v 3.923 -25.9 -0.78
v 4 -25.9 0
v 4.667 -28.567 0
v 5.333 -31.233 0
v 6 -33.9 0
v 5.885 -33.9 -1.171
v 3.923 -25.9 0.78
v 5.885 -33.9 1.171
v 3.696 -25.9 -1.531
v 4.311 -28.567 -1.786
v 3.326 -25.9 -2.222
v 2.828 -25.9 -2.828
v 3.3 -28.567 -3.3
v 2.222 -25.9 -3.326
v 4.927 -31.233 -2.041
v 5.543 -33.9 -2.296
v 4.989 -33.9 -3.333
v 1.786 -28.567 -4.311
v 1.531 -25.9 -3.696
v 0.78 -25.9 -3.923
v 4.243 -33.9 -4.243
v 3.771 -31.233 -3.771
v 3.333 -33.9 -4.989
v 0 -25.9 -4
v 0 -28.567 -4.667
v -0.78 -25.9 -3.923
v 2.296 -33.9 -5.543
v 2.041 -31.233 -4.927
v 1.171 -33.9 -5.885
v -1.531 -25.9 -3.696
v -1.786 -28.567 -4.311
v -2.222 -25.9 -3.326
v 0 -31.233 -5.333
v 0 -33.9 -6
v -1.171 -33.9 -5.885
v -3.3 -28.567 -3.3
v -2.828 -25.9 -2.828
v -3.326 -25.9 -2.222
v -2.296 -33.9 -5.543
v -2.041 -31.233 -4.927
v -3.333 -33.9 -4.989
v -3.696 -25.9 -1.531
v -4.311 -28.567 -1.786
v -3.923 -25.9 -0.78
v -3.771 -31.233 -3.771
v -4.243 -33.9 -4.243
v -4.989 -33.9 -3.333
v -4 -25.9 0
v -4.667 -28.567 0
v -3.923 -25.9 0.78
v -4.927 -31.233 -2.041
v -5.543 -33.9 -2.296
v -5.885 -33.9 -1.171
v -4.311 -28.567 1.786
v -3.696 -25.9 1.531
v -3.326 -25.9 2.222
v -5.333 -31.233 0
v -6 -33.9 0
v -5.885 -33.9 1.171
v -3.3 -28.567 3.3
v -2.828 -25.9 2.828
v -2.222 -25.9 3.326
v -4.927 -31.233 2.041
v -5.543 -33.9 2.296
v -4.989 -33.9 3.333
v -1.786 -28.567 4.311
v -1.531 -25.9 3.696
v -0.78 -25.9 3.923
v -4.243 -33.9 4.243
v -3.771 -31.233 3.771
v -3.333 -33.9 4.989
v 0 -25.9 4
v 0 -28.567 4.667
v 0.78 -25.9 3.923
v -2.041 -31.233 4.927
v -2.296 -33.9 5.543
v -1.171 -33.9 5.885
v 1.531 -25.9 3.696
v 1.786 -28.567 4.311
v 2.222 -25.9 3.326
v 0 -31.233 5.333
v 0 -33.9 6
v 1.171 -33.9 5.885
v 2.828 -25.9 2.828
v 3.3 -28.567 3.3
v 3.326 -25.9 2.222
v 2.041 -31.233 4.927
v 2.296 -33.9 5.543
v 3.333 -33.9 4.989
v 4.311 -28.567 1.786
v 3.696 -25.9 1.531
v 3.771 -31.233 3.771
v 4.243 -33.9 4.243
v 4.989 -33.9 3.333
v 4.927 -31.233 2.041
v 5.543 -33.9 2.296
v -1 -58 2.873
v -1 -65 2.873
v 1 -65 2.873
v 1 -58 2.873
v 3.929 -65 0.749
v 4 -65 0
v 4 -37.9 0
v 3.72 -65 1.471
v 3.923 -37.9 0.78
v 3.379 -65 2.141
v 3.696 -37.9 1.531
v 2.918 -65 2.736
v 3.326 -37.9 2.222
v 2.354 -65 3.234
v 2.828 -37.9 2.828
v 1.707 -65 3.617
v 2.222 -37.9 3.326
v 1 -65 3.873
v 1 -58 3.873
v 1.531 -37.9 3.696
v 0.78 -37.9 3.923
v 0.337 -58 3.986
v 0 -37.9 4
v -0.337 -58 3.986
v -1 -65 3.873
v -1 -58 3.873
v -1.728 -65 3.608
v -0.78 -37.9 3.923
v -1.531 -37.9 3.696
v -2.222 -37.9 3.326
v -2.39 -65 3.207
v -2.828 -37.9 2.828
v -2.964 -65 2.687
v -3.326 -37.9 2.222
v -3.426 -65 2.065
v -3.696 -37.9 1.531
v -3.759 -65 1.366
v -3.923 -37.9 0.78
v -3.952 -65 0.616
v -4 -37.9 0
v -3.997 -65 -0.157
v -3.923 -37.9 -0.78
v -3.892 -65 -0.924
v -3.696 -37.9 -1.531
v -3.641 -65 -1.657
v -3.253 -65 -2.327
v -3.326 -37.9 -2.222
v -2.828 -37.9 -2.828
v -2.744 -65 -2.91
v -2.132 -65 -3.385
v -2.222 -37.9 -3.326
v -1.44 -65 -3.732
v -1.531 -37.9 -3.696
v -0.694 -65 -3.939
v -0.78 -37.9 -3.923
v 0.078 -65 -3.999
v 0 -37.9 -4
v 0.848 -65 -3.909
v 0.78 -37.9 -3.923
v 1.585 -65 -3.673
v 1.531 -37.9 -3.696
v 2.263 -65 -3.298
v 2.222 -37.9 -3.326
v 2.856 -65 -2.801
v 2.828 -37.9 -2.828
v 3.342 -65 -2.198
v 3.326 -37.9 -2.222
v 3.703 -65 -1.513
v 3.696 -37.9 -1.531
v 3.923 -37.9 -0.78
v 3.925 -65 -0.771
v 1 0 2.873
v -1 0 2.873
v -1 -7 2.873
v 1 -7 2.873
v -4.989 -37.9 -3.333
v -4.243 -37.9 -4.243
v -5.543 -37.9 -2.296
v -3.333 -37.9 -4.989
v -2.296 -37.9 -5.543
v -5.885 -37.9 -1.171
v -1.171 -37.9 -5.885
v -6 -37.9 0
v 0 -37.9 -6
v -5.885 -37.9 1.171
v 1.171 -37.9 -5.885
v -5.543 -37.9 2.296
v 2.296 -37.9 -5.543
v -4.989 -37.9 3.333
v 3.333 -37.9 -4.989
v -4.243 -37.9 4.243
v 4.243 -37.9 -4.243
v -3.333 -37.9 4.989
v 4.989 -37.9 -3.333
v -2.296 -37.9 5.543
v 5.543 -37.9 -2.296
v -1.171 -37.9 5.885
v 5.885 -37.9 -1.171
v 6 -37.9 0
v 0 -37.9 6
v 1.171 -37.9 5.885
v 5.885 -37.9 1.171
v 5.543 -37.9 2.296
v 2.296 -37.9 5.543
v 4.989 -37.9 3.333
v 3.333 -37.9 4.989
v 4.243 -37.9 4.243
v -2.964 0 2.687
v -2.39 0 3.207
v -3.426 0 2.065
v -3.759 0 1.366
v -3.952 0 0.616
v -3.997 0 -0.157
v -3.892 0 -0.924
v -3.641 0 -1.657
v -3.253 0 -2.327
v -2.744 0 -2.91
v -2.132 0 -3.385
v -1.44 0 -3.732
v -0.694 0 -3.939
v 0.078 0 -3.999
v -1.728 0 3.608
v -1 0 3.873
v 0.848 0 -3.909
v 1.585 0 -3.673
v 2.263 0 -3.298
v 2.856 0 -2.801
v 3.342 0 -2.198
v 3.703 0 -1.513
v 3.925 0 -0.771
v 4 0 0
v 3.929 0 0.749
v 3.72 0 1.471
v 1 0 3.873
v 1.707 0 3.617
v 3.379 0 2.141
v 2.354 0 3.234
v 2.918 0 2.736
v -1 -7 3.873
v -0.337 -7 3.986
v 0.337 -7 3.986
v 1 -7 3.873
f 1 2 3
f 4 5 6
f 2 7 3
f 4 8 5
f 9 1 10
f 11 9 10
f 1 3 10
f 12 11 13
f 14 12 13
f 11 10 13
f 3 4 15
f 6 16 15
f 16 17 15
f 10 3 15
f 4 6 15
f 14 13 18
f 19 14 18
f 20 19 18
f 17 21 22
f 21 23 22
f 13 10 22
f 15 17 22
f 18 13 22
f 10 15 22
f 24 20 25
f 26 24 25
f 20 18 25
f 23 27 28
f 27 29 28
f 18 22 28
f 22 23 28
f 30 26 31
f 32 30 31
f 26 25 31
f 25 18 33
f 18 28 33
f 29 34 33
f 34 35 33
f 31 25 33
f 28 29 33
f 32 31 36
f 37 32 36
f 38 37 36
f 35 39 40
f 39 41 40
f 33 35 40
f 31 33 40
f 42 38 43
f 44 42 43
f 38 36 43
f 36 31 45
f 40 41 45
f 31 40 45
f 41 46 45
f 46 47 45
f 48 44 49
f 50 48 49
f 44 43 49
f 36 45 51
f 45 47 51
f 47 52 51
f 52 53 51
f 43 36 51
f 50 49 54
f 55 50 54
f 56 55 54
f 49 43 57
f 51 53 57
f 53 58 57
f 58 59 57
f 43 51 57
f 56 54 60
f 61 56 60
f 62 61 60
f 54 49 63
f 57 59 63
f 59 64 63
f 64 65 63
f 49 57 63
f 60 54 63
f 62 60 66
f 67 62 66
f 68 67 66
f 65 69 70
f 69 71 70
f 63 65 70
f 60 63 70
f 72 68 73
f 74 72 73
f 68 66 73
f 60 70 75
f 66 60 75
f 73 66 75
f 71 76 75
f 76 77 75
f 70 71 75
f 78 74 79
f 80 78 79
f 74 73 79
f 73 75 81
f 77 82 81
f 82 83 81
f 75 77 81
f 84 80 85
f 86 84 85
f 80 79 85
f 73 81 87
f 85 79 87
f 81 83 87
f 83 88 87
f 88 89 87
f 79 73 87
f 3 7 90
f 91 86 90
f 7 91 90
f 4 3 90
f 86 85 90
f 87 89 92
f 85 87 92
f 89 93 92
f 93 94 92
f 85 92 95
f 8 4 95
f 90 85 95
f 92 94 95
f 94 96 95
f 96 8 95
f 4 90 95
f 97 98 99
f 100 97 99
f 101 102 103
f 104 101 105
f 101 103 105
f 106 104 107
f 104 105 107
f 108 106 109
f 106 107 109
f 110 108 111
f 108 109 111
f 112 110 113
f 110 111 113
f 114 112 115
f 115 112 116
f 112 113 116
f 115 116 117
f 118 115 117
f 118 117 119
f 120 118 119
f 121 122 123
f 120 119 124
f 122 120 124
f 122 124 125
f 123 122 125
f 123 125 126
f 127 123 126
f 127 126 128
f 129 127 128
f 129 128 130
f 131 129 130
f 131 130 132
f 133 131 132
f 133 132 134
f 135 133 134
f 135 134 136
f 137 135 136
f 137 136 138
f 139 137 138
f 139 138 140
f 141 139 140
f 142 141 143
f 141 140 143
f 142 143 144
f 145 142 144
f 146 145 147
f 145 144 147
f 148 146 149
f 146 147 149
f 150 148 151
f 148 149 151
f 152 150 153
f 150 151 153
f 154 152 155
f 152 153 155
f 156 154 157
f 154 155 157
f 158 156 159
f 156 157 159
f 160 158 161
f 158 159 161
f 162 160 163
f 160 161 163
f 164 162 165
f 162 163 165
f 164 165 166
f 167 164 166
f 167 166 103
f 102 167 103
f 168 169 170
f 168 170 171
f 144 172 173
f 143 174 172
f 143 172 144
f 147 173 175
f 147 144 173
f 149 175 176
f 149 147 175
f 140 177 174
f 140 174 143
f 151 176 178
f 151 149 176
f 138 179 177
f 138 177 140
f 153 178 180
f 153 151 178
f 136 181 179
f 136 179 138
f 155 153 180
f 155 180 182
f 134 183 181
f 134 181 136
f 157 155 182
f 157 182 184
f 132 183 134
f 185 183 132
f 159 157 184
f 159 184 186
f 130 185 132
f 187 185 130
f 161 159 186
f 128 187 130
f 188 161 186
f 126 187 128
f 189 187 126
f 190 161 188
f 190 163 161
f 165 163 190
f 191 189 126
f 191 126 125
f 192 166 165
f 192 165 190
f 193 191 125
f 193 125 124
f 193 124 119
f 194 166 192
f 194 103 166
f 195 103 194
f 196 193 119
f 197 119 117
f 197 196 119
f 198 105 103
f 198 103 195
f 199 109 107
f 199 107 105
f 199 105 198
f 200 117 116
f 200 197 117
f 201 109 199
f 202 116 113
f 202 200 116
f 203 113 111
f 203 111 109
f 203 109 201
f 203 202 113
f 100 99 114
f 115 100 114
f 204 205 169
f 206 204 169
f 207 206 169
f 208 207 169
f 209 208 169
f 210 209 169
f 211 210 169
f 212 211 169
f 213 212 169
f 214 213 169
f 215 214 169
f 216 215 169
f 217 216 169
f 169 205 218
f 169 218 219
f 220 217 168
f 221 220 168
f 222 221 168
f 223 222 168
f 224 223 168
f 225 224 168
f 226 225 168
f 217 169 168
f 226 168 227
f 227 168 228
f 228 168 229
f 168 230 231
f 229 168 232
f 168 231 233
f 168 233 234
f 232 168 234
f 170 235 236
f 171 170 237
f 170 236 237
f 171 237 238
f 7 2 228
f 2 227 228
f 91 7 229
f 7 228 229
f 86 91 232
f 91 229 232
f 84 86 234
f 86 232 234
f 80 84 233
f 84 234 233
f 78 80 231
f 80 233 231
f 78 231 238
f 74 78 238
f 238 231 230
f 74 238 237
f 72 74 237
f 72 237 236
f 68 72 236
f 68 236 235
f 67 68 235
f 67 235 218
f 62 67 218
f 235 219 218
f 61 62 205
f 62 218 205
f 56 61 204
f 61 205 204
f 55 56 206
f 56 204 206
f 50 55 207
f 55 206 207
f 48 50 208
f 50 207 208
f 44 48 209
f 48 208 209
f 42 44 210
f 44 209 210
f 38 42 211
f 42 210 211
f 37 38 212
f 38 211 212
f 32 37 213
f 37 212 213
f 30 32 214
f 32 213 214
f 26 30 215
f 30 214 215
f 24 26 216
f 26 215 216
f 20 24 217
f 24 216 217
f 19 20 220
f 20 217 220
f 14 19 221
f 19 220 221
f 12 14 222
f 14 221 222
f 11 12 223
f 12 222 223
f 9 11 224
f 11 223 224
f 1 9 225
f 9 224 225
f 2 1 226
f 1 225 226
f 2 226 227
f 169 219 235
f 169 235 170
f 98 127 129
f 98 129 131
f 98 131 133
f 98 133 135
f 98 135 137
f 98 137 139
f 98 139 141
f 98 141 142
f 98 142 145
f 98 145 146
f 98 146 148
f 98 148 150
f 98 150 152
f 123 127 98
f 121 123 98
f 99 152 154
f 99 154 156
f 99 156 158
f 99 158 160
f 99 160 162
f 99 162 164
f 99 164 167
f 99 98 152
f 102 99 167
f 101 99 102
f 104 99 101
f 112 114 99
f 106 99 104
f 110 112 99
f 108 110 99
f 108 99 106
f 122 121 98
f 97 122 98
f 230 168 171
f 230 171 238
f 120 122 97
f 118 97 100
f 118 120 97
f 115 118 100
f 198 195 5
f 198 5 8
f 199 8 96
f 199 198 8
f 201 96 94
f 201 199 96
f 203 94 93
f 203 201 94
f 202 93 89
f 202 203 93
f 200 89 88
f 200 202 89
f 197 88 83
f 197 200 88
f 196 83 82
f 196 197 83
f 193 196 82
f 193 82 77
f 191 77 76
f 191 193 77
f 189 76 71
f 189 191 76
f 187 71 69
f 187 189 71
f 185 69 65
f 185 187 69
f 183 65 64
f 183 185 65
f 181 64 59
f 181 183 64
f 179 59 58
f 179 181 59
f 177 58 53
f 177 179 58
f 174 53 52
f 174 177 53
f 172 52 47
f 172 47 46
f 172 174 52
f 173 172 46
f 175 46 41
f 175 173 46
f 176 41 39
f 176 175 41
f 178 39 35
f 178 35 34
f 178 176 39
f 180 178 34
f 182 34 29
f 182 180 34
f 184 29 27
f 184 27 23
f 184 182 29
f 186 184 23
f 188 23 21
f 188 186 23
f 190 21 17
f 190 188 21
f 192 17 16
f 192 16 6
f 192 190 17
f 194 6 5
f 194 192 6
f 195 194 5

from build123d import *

# Parameters (mm, degrees)
F0_R     = 4
F1_DEPTH = 65
F3_R     = 6
F4_DEPTH = 4
F5_SIZE2 = 1.99999
F5_SIZE  = 7.99999
F7_DEPTH = 7


# Not quite as in the source:
# - a fillet or chamfer is up to 0.001 mm smaller than in the source, because OpenCascade refuses the exact size
# - a pattern or mirror of a feature is missing from the dataset's text; its kind, count and spacing are read off the source's solid


with BuildPart() as f1:
    # F0 (on Front) → F1 (new body)
    with BuildSketch(Plane.XZ):
        Circle(F0_R)
    extrude(amount=F1_DEPTH)

    # F3 (on offset) → F4 (join)
    with BuildSketch(Plane.XZ.offset(37.9)):
        Circle(F3_R)
    extrude(amount=-F4_DEPTH)

    # F5 (size 8 and 2 in the source; OpenCascade refuses exactly that, so slightly less here)
    f5_edges = [f1.edges().sort_by_distance(p)[0] for p in [
        (-4, -33.9, 0),
    ]]
    f5_side = f1.faces().sort_by_distance((-4, -16.95, 0))[0]
    chamfer(f5_edges, length=F5_SIZE, length2=F5_SIZE2, reference=f5_side)

    # F6 (on face) → F7 (cut)
    with BuildSketch(Plane.XZ.offset(65)):
        Polygon((0, 4.4108442962), (-1, 3.8729833462), (-1, 2.8729833462), (1, 2.8729833462), (1, 3.8729833462), align=None)
    f7 = extrude(amount=-F7_DEPTH, mode=Mode.SUBTRACT)

    # F7_copies: F7 across plane
    add(f7.mirror(Plane.ZX.offset(-32.5)), mode=Mode.SUBTRACT)


solid = f1.part
